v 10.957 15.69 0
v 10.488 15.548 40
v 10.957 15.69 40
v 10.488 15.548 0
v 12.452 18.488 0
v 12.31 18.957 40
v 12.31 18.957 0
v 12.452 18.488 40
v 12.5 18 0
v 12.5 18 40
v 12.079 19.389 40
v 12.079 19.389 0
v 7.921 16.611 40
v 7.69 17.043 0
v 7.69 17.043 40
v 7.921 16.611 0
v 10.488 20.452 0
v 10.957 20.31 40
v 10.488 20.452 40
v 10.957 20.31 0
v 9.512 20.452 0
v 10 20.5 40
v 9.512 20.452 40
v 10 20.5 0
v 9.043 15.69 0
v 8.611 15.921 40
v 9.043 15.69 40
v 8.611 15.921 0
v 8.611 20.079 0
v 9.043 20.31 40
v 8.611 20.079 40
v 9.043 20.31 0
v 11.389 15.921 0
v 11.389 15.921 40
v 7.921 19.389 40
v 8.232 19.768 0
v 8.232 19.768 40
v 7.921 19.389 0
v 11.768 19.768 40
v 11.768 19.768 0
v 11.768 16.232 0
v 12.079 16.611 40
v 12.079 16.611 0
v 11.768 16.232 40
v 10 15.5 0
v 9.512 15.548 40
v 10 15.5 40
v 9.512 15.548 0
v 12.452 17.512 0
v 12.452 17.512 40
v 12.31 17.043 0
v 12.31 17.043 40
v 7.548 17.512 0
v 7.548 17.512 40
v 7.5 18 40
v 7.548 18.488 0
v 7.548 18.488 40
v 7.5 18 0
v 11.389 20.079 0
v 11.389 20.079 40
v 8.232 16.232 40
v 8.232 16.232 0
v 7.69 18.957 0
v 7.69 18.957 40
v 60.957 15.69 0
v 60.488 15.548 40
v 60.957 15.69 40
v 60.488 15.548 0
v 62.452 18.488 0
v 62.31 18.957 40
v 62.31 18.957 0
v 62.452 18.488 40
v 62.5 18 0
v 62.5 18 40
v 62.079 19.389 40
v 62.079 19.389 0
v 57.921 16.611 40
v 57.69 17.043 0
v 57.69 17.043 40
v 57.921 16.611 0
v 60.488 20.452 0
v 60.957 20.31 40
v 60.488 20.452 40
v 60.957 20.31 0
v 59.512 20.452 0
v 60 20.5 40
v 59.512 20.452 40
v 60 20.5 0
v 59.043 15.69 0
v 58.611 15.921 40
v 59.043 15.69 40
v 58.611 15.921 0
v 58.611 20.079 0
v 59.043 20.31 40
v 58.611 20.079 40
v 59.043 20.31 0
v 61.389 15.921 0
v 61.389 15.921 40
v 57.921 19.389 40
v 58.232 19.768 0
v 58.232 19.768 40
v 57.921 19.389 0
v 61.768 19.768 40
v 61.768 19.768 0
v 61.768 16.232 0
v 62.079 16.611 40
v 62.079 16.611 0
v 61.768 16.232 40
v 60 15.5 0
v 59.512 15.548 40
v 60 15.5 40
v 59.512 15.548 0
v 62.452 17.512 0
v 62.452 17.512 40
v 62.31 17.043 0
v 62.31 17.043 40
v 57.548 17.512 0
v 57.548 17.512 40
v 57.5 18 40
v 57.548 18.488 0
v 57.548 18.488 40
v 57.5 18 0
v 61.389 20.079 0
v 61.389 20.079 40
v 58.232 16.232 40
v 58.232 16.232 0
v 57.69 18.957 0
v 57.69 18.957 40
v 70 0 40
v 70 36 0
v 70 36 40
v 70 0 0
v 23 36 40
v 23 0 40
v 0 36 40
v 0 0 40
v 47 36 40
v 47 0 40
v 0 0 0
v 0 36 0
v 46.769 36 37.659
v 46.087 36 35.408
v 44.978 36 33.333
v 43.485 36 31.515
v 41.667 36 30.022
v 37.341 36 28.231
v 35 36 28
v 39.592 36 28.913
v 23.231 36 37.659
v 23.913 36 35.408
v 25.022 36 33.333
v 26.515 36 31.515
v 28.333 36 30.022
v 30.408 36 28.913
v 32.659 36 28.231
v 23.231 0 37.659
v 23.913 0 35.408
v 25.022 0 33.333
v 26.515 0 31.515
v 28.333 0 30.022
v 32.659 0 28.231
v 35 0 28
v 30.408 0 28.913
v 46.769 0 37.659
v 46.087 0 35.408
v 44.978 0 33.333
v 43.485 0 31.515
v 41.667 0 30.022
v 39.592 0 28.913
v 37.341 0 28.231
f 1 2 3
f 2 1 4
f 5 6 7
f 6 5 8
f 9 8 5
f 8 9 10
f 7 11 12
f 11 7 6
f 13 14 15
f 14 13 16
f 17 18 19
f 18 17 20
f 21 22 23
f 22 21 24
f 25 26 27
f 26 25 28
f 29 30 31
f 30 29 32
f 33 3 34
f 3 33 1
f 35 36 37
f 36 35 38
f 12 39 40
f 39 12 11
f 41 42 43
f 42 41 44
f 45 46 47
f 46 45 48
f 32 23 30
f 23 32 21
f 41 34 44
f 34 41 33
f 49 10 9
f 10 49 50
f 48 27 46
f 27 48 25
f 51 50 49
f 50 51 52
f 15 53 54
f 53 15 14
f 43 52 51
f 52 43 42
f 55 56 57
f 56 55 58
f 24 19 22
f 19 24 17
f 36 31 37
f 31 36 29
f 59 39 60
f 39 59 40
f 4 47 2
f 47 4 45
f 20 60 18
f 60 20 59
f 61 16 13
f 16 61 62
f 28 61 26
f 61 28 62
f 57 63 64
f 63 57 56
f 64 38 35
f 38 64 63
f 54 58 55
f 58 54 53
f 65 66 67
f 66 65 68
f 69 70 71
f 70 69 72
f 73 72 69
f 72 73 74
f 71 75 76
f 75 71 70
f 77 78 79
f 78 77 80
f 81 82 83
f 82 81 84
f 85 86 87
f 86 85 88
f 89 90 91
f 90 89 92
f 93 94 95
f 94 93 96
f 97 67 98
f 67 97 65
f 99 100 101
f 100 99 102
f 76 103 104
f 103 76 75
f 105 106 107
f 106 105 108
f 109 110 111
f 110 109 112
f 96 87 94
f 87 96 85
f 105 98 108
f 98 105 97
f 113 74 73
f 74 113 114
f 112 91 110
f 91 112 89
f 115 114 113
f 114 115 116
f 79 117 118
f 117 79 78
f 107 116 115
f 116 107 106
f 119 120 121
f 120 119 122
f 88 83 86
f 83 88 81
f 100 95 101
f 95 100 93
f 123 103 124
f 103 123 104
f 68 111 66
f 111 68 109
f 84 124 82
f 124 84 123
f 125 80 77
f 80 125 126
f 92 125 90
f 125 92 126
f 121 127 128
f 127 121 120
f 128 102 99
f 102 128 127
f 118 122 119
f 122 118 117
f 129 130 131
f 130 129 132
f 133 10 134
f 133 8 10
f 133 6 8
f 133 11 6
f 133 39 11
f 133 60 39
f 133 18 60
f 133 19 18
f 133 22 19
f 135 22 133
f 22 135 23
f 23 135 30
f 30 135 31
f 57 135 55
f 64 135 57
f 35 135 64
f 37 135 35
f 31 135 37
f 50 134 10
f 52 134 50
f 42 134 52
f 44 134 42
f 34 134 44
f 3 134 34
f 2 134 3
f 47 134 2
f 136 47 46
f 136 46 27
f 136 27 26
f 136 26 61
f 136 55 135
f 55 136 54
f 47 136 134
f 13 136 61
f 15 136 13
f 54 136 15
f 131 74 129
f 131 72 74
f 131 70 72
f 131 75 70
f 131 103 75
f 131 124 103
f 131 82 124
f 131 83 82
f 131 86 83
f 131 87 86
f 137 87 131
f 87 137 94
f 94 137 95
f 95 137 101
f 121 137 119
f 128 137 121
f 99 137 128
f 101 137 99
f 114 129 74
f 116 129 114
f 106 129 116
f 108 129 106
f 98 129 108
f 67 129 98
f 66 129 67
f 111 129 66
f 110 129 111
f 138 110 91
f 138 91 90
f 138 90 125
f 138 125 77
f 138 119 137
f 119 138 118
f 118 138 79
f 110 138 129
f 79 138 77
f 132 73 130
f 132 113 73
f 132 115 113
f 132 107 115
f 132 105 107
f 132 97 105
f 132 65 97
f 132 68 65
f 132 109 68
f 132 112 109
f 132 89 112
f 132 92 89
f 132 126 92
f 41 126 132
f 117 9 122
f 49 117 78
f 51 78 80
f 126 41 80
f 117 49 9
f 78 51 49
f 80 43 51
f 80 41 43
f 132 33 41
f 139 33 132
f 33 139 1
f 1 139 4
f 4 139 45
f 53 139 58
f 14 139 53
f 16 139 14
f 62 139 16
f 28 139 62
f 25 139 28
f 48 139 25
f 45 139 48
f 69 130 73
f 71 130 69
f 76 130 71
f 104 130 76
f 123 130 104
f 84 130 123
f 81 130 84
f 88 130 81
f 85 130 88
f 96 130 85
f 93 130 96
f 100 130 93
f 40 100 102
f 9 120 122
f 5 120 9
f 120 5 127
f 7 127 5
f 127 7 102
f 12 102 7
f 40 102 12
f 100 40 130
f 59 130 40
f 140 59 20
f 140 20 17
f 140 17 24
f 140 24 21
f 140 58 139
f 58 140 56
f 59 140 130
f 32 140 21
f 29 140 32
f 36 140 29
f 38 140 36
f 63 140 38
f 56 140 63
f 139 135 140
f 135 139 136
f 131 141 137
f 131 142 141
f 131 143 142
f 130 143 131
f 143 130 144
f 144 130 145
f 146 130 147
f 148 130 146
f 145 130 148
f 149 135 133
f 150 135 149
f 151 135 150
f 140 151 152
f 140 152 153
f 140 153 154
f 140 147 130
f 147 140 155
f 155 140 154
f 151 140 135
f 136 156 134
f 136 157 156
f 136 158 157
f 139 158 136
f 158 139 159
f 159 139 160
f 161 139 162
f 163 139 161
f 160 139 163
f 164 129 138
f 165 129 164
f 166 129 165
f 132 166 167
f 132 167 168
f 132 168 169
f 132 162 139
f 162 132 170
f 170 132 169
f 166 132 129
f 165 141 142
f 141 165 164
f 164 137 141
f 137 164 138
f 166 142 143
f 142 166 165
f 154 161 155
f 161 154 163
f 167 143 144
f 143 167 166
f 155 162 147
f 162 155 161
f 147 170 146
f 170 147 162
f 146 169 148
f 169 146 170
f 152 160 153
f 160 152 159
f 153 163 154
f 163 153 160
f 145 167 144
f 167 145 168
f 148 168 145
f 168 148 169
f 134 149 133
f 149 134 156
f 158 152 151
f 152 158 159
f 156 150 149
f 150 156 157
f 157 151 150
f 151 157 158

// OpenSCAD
$fn = 32;

// ----------------------------------------------------------------------
// Saddle clamp: plain shaft clamp
// ----------------------------------------------------------------------

// --- parameters (mm) ---
blk_l = 70;               // block length, X
blk_w = 36;               // block width, Y
blk_h = 40;               // block height
clamp_r = 12;             // shaft groove radius
hole_r = 2.5;             // bolt hole radius
hole_m = 10;              // bolt hole margin from the ends
fit_tol = 0.1;            // tolerance for press fits, mm
free_tol = 0.5;           // tolerance for clearance fits, mm

saw_depth = clamp_r + 3;  // saw kerf depth

difference() {
  cube([blk_l, blk_w, blk_h]);
  translate([blk_l / 2, -1, blk_h])
    rotate([-90, 0, 0])
      cylinder(h = blk_w + 2, r = clamp_r);
  for (sx = [0, 1])
    translate([sx ? blk_l - hole_m : hole_m, blk_w / 2, -1])
      cylinder(r = hole_r, h = blk_h + 2);
}
